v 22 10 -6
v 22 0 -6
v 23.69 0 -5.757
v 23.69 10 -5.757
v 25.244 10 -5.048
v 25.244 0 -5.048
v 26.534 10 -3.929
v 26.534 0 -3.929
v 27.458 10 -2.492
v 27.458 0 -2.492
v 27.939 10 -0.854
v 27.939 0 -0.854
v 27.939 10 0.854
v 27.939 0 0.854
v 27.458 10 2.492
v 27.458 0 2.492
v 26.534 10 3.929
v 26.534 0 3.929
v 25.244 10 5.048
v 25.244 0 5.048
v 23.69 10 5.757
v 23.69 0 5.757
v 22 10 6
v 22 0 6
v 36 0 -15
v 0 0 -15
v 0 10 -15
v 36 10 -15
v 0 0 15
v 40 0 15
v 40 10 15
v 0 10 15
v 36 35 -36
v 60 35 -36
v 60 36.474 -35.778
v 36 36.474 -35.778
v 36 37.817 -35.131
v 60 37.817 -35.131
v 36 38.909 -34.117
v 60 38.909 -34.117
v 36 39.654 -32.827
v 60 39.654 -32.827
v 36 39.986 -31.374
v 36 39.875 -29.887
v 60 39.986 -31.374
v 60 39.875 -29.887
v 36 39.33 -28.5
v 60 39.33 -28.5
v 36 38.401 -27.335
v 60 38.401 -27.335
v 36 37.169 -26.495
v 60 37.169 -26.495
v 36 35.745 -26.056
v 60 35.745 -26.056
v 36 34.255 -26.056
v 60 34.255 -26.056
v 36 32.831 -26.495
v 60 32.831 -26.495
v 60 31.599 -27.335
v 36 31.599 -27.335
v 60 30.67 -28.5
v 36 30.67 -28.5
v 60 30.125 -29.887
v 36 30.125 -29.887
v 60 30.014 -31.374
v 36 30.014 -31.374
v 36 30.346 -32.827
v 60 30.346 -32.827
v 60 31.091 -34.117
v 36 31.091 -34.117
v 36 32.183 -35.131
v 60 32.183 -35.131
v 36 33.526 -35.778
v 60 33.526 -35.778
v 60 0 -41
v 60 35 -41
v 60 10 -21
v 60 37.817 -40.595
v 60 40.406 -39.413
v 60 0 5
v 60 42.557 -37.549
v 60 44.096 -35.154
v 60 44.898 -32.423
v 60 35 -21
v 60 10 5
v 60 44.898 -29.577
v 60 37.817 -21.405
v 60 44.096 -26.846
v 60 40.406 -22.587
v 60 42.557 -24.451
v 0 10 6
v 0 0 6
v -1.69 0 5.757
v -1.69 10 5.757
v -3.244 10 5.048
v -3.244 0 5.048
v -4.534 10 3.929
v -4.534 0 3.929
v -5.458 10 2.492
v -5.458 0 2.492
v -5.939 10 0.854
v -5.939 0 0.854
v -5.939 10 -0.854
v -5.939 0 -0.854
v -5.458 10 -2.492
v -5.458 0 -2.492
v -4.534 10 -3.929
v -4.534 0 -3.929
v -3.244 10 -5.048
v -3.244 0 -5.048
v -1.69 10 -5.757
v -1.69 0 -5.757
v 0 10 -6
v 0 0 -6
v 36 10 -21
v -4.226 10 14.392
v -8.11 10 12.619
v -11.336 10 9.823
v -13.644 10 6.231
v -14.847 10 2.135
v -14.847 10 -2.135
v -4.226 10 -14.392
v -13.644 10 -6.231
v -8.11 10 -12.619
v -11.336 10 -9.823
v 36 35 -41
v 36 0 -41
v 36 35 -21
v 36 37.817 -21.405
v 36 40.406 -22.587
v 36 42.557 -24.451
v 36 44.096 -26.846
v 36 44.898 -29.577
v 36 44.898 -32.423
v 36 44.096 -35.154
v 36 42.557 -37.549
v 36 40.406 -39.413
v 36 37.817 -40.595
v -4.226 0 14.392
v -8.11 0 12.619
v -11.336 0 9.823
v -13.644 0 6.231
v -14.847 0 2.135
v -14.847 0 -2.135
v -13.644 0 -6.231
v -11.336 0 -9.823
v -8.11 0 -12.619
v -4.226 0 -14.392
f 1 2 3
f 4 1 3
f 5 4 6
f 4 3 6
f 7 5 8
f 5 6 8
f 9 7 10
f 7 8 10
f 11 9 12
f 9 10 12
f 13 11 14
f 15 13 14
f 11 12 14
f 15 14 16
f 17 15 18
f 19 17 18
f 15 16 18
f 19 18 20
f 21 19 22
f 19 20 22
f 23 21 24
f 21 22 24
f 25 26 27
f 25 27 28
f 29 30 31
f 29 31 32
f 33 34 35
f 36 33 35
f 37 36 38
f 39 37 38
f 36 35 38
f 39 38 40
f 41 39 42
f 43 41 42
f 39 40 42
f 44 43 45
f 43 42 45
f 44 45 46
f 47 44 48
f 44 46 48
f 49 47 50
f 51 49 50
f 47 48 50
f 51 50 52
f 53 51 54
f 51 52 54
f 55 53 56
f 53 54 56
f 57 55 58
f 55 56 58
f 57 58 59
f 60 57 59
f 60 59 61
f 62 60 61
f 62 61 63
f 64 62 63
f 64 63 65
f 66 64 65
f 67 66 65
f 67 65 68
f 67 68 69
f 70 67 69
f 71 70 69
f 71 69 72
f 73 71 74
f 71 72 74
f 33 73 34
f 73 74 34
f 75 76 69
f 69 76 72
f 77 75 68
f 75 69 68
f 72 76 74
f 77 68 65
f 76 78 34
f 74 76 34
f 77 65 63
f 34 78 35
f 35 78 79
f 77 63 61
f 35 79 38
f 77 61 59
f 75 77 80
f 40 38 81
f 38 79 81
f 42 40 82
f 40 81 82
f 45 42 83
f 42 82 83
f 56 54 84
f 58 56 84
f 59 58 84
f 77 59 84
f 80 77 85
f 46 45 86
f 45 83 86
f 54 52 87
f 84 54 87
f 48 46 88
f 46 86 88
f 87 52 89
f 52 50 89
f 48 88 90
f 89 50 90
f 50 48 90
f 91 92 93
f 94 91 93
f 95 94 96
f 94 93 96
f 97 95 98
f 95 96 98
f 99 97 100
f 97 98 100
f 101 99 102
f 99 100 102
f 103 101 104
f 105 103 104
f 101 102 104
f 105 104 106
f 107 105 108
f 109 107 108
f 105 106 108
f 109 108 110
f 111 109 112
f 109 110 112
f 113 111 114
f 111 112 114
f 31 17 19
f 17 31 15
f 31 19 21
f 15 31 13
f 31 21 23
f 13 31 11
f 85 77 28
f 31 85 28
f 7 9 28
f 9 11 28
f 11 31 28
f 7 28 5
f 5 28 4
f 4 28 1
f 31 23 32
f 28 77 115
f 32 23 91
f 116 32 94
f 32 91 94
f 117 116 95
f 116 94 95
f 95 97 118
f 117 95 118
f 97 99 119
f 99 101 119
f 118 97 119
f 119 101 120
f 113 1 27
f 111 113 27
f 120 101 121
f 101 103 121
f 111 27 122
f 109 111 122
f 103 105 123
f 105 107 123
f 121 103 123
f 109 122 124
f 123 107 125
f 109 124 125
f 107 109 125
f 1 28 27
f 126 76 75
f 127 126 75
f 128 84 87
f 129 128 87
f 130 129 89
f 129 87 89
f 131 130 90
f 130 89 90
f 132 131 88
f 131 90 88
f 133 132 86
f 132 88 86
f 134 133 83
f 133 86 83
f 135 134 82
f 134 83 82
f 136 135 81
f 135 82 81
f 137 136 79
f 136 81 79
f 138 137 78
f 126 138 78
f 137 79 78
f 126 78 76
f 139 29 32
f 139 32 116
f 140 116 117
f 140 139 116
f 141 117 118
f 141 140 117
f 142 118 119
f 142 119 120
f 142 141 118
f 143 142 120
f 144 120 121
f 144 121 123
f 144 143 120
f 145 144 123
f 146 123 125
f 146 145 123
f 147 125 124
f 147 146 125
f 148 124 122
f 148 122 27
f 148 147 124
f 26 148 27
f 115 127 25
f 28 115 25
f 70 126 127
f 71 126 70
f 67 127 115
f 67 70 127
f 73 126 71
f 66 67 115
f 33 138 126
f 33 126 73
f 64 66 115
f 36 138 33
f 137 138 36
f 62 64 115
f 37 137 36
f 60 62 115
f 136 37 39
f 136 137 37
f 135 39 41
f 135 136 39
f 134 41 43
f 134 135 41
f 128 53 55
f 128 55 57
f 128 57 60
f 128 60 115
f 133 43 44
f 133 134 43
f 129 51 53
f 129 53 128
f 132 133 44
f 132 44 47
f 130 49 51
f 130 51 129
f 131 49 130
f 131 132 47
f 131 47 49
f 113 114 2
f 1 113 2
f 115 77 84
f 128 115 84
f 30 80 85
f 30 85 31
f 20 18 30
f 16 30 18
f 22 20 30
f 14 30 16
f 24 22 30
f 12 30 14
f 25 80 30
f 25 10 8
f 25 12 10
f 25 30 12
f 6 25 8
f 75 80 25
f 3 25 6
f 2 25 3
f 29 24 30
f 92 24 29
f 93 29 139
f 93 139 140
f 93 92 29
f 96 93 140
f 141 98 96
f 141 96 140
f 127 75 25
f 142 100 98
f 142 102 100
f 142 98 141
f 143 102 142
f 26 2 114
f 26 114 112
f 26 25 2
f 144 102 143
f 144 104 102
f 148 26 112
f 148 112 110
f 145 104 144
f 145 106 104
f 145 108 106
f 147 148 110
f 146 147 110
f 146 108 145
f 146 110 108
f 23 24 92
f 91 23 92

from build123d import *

# Parameters (mm, degrees)
EXTRUDE_1_DEPTH = 10
SKETCH_3_R      = 5
EXTRUDE_2_DEPTH = 24


with BuildPart() as part:
    # 草图1 → 凸台-拉伸1 (new body)
    with BuildSketch(Plane(origin=(0, 0, 0), x_dir=(1, 0, 0), z_dir=(0, 1, 0))):
        with BuildLine():
            Line((0, 15), (36, 15))
            Line((36, 15), (36, 41))
            Line((36, 41), (60, 41))
            Line((60, 41), (60, -5))
            Line((60, -5), (40, -15))
            Line((40, -15), (0, -15))
            ThreePointArc((0, -15), (-15, 0), (0, 15))
        make_face()
        with BuildLine():
            Line((0, 6), (22, 6))
            ThreePointArc((22, 6), (28, 0), (22, -6))
            Line((22, -6), (0, -6))
            ThreePointArc((0, -6), (-6, 0), (0, 6))
        make_face(mode=Mode.SUBTRACT)
    extrude(amount=EXTRUDE_1_DEPTH)

    # 草图3 → 凸台-拉伸2 (add)
    with BuildSketch(Plane(origin=(60, 0, 0), x_dir=(0, 0, -1), z_dir=(1, 0, 0))):
        with BuildLine():
            Line((41, 10), (21, 10))
            Line((21, 10), (21, 35))
            ThreePointArc((21, 35), (31, 45), (41, 35))
            Line((41, 35), (41, 10))
        make_face()
        with Locations((31, 35)):
            Circle(SKETCH_3_R, mode=Mode.SUBTRACT)
    extrude(amount=-EXTRUDE_2_DEPTH)


solid = part.part
